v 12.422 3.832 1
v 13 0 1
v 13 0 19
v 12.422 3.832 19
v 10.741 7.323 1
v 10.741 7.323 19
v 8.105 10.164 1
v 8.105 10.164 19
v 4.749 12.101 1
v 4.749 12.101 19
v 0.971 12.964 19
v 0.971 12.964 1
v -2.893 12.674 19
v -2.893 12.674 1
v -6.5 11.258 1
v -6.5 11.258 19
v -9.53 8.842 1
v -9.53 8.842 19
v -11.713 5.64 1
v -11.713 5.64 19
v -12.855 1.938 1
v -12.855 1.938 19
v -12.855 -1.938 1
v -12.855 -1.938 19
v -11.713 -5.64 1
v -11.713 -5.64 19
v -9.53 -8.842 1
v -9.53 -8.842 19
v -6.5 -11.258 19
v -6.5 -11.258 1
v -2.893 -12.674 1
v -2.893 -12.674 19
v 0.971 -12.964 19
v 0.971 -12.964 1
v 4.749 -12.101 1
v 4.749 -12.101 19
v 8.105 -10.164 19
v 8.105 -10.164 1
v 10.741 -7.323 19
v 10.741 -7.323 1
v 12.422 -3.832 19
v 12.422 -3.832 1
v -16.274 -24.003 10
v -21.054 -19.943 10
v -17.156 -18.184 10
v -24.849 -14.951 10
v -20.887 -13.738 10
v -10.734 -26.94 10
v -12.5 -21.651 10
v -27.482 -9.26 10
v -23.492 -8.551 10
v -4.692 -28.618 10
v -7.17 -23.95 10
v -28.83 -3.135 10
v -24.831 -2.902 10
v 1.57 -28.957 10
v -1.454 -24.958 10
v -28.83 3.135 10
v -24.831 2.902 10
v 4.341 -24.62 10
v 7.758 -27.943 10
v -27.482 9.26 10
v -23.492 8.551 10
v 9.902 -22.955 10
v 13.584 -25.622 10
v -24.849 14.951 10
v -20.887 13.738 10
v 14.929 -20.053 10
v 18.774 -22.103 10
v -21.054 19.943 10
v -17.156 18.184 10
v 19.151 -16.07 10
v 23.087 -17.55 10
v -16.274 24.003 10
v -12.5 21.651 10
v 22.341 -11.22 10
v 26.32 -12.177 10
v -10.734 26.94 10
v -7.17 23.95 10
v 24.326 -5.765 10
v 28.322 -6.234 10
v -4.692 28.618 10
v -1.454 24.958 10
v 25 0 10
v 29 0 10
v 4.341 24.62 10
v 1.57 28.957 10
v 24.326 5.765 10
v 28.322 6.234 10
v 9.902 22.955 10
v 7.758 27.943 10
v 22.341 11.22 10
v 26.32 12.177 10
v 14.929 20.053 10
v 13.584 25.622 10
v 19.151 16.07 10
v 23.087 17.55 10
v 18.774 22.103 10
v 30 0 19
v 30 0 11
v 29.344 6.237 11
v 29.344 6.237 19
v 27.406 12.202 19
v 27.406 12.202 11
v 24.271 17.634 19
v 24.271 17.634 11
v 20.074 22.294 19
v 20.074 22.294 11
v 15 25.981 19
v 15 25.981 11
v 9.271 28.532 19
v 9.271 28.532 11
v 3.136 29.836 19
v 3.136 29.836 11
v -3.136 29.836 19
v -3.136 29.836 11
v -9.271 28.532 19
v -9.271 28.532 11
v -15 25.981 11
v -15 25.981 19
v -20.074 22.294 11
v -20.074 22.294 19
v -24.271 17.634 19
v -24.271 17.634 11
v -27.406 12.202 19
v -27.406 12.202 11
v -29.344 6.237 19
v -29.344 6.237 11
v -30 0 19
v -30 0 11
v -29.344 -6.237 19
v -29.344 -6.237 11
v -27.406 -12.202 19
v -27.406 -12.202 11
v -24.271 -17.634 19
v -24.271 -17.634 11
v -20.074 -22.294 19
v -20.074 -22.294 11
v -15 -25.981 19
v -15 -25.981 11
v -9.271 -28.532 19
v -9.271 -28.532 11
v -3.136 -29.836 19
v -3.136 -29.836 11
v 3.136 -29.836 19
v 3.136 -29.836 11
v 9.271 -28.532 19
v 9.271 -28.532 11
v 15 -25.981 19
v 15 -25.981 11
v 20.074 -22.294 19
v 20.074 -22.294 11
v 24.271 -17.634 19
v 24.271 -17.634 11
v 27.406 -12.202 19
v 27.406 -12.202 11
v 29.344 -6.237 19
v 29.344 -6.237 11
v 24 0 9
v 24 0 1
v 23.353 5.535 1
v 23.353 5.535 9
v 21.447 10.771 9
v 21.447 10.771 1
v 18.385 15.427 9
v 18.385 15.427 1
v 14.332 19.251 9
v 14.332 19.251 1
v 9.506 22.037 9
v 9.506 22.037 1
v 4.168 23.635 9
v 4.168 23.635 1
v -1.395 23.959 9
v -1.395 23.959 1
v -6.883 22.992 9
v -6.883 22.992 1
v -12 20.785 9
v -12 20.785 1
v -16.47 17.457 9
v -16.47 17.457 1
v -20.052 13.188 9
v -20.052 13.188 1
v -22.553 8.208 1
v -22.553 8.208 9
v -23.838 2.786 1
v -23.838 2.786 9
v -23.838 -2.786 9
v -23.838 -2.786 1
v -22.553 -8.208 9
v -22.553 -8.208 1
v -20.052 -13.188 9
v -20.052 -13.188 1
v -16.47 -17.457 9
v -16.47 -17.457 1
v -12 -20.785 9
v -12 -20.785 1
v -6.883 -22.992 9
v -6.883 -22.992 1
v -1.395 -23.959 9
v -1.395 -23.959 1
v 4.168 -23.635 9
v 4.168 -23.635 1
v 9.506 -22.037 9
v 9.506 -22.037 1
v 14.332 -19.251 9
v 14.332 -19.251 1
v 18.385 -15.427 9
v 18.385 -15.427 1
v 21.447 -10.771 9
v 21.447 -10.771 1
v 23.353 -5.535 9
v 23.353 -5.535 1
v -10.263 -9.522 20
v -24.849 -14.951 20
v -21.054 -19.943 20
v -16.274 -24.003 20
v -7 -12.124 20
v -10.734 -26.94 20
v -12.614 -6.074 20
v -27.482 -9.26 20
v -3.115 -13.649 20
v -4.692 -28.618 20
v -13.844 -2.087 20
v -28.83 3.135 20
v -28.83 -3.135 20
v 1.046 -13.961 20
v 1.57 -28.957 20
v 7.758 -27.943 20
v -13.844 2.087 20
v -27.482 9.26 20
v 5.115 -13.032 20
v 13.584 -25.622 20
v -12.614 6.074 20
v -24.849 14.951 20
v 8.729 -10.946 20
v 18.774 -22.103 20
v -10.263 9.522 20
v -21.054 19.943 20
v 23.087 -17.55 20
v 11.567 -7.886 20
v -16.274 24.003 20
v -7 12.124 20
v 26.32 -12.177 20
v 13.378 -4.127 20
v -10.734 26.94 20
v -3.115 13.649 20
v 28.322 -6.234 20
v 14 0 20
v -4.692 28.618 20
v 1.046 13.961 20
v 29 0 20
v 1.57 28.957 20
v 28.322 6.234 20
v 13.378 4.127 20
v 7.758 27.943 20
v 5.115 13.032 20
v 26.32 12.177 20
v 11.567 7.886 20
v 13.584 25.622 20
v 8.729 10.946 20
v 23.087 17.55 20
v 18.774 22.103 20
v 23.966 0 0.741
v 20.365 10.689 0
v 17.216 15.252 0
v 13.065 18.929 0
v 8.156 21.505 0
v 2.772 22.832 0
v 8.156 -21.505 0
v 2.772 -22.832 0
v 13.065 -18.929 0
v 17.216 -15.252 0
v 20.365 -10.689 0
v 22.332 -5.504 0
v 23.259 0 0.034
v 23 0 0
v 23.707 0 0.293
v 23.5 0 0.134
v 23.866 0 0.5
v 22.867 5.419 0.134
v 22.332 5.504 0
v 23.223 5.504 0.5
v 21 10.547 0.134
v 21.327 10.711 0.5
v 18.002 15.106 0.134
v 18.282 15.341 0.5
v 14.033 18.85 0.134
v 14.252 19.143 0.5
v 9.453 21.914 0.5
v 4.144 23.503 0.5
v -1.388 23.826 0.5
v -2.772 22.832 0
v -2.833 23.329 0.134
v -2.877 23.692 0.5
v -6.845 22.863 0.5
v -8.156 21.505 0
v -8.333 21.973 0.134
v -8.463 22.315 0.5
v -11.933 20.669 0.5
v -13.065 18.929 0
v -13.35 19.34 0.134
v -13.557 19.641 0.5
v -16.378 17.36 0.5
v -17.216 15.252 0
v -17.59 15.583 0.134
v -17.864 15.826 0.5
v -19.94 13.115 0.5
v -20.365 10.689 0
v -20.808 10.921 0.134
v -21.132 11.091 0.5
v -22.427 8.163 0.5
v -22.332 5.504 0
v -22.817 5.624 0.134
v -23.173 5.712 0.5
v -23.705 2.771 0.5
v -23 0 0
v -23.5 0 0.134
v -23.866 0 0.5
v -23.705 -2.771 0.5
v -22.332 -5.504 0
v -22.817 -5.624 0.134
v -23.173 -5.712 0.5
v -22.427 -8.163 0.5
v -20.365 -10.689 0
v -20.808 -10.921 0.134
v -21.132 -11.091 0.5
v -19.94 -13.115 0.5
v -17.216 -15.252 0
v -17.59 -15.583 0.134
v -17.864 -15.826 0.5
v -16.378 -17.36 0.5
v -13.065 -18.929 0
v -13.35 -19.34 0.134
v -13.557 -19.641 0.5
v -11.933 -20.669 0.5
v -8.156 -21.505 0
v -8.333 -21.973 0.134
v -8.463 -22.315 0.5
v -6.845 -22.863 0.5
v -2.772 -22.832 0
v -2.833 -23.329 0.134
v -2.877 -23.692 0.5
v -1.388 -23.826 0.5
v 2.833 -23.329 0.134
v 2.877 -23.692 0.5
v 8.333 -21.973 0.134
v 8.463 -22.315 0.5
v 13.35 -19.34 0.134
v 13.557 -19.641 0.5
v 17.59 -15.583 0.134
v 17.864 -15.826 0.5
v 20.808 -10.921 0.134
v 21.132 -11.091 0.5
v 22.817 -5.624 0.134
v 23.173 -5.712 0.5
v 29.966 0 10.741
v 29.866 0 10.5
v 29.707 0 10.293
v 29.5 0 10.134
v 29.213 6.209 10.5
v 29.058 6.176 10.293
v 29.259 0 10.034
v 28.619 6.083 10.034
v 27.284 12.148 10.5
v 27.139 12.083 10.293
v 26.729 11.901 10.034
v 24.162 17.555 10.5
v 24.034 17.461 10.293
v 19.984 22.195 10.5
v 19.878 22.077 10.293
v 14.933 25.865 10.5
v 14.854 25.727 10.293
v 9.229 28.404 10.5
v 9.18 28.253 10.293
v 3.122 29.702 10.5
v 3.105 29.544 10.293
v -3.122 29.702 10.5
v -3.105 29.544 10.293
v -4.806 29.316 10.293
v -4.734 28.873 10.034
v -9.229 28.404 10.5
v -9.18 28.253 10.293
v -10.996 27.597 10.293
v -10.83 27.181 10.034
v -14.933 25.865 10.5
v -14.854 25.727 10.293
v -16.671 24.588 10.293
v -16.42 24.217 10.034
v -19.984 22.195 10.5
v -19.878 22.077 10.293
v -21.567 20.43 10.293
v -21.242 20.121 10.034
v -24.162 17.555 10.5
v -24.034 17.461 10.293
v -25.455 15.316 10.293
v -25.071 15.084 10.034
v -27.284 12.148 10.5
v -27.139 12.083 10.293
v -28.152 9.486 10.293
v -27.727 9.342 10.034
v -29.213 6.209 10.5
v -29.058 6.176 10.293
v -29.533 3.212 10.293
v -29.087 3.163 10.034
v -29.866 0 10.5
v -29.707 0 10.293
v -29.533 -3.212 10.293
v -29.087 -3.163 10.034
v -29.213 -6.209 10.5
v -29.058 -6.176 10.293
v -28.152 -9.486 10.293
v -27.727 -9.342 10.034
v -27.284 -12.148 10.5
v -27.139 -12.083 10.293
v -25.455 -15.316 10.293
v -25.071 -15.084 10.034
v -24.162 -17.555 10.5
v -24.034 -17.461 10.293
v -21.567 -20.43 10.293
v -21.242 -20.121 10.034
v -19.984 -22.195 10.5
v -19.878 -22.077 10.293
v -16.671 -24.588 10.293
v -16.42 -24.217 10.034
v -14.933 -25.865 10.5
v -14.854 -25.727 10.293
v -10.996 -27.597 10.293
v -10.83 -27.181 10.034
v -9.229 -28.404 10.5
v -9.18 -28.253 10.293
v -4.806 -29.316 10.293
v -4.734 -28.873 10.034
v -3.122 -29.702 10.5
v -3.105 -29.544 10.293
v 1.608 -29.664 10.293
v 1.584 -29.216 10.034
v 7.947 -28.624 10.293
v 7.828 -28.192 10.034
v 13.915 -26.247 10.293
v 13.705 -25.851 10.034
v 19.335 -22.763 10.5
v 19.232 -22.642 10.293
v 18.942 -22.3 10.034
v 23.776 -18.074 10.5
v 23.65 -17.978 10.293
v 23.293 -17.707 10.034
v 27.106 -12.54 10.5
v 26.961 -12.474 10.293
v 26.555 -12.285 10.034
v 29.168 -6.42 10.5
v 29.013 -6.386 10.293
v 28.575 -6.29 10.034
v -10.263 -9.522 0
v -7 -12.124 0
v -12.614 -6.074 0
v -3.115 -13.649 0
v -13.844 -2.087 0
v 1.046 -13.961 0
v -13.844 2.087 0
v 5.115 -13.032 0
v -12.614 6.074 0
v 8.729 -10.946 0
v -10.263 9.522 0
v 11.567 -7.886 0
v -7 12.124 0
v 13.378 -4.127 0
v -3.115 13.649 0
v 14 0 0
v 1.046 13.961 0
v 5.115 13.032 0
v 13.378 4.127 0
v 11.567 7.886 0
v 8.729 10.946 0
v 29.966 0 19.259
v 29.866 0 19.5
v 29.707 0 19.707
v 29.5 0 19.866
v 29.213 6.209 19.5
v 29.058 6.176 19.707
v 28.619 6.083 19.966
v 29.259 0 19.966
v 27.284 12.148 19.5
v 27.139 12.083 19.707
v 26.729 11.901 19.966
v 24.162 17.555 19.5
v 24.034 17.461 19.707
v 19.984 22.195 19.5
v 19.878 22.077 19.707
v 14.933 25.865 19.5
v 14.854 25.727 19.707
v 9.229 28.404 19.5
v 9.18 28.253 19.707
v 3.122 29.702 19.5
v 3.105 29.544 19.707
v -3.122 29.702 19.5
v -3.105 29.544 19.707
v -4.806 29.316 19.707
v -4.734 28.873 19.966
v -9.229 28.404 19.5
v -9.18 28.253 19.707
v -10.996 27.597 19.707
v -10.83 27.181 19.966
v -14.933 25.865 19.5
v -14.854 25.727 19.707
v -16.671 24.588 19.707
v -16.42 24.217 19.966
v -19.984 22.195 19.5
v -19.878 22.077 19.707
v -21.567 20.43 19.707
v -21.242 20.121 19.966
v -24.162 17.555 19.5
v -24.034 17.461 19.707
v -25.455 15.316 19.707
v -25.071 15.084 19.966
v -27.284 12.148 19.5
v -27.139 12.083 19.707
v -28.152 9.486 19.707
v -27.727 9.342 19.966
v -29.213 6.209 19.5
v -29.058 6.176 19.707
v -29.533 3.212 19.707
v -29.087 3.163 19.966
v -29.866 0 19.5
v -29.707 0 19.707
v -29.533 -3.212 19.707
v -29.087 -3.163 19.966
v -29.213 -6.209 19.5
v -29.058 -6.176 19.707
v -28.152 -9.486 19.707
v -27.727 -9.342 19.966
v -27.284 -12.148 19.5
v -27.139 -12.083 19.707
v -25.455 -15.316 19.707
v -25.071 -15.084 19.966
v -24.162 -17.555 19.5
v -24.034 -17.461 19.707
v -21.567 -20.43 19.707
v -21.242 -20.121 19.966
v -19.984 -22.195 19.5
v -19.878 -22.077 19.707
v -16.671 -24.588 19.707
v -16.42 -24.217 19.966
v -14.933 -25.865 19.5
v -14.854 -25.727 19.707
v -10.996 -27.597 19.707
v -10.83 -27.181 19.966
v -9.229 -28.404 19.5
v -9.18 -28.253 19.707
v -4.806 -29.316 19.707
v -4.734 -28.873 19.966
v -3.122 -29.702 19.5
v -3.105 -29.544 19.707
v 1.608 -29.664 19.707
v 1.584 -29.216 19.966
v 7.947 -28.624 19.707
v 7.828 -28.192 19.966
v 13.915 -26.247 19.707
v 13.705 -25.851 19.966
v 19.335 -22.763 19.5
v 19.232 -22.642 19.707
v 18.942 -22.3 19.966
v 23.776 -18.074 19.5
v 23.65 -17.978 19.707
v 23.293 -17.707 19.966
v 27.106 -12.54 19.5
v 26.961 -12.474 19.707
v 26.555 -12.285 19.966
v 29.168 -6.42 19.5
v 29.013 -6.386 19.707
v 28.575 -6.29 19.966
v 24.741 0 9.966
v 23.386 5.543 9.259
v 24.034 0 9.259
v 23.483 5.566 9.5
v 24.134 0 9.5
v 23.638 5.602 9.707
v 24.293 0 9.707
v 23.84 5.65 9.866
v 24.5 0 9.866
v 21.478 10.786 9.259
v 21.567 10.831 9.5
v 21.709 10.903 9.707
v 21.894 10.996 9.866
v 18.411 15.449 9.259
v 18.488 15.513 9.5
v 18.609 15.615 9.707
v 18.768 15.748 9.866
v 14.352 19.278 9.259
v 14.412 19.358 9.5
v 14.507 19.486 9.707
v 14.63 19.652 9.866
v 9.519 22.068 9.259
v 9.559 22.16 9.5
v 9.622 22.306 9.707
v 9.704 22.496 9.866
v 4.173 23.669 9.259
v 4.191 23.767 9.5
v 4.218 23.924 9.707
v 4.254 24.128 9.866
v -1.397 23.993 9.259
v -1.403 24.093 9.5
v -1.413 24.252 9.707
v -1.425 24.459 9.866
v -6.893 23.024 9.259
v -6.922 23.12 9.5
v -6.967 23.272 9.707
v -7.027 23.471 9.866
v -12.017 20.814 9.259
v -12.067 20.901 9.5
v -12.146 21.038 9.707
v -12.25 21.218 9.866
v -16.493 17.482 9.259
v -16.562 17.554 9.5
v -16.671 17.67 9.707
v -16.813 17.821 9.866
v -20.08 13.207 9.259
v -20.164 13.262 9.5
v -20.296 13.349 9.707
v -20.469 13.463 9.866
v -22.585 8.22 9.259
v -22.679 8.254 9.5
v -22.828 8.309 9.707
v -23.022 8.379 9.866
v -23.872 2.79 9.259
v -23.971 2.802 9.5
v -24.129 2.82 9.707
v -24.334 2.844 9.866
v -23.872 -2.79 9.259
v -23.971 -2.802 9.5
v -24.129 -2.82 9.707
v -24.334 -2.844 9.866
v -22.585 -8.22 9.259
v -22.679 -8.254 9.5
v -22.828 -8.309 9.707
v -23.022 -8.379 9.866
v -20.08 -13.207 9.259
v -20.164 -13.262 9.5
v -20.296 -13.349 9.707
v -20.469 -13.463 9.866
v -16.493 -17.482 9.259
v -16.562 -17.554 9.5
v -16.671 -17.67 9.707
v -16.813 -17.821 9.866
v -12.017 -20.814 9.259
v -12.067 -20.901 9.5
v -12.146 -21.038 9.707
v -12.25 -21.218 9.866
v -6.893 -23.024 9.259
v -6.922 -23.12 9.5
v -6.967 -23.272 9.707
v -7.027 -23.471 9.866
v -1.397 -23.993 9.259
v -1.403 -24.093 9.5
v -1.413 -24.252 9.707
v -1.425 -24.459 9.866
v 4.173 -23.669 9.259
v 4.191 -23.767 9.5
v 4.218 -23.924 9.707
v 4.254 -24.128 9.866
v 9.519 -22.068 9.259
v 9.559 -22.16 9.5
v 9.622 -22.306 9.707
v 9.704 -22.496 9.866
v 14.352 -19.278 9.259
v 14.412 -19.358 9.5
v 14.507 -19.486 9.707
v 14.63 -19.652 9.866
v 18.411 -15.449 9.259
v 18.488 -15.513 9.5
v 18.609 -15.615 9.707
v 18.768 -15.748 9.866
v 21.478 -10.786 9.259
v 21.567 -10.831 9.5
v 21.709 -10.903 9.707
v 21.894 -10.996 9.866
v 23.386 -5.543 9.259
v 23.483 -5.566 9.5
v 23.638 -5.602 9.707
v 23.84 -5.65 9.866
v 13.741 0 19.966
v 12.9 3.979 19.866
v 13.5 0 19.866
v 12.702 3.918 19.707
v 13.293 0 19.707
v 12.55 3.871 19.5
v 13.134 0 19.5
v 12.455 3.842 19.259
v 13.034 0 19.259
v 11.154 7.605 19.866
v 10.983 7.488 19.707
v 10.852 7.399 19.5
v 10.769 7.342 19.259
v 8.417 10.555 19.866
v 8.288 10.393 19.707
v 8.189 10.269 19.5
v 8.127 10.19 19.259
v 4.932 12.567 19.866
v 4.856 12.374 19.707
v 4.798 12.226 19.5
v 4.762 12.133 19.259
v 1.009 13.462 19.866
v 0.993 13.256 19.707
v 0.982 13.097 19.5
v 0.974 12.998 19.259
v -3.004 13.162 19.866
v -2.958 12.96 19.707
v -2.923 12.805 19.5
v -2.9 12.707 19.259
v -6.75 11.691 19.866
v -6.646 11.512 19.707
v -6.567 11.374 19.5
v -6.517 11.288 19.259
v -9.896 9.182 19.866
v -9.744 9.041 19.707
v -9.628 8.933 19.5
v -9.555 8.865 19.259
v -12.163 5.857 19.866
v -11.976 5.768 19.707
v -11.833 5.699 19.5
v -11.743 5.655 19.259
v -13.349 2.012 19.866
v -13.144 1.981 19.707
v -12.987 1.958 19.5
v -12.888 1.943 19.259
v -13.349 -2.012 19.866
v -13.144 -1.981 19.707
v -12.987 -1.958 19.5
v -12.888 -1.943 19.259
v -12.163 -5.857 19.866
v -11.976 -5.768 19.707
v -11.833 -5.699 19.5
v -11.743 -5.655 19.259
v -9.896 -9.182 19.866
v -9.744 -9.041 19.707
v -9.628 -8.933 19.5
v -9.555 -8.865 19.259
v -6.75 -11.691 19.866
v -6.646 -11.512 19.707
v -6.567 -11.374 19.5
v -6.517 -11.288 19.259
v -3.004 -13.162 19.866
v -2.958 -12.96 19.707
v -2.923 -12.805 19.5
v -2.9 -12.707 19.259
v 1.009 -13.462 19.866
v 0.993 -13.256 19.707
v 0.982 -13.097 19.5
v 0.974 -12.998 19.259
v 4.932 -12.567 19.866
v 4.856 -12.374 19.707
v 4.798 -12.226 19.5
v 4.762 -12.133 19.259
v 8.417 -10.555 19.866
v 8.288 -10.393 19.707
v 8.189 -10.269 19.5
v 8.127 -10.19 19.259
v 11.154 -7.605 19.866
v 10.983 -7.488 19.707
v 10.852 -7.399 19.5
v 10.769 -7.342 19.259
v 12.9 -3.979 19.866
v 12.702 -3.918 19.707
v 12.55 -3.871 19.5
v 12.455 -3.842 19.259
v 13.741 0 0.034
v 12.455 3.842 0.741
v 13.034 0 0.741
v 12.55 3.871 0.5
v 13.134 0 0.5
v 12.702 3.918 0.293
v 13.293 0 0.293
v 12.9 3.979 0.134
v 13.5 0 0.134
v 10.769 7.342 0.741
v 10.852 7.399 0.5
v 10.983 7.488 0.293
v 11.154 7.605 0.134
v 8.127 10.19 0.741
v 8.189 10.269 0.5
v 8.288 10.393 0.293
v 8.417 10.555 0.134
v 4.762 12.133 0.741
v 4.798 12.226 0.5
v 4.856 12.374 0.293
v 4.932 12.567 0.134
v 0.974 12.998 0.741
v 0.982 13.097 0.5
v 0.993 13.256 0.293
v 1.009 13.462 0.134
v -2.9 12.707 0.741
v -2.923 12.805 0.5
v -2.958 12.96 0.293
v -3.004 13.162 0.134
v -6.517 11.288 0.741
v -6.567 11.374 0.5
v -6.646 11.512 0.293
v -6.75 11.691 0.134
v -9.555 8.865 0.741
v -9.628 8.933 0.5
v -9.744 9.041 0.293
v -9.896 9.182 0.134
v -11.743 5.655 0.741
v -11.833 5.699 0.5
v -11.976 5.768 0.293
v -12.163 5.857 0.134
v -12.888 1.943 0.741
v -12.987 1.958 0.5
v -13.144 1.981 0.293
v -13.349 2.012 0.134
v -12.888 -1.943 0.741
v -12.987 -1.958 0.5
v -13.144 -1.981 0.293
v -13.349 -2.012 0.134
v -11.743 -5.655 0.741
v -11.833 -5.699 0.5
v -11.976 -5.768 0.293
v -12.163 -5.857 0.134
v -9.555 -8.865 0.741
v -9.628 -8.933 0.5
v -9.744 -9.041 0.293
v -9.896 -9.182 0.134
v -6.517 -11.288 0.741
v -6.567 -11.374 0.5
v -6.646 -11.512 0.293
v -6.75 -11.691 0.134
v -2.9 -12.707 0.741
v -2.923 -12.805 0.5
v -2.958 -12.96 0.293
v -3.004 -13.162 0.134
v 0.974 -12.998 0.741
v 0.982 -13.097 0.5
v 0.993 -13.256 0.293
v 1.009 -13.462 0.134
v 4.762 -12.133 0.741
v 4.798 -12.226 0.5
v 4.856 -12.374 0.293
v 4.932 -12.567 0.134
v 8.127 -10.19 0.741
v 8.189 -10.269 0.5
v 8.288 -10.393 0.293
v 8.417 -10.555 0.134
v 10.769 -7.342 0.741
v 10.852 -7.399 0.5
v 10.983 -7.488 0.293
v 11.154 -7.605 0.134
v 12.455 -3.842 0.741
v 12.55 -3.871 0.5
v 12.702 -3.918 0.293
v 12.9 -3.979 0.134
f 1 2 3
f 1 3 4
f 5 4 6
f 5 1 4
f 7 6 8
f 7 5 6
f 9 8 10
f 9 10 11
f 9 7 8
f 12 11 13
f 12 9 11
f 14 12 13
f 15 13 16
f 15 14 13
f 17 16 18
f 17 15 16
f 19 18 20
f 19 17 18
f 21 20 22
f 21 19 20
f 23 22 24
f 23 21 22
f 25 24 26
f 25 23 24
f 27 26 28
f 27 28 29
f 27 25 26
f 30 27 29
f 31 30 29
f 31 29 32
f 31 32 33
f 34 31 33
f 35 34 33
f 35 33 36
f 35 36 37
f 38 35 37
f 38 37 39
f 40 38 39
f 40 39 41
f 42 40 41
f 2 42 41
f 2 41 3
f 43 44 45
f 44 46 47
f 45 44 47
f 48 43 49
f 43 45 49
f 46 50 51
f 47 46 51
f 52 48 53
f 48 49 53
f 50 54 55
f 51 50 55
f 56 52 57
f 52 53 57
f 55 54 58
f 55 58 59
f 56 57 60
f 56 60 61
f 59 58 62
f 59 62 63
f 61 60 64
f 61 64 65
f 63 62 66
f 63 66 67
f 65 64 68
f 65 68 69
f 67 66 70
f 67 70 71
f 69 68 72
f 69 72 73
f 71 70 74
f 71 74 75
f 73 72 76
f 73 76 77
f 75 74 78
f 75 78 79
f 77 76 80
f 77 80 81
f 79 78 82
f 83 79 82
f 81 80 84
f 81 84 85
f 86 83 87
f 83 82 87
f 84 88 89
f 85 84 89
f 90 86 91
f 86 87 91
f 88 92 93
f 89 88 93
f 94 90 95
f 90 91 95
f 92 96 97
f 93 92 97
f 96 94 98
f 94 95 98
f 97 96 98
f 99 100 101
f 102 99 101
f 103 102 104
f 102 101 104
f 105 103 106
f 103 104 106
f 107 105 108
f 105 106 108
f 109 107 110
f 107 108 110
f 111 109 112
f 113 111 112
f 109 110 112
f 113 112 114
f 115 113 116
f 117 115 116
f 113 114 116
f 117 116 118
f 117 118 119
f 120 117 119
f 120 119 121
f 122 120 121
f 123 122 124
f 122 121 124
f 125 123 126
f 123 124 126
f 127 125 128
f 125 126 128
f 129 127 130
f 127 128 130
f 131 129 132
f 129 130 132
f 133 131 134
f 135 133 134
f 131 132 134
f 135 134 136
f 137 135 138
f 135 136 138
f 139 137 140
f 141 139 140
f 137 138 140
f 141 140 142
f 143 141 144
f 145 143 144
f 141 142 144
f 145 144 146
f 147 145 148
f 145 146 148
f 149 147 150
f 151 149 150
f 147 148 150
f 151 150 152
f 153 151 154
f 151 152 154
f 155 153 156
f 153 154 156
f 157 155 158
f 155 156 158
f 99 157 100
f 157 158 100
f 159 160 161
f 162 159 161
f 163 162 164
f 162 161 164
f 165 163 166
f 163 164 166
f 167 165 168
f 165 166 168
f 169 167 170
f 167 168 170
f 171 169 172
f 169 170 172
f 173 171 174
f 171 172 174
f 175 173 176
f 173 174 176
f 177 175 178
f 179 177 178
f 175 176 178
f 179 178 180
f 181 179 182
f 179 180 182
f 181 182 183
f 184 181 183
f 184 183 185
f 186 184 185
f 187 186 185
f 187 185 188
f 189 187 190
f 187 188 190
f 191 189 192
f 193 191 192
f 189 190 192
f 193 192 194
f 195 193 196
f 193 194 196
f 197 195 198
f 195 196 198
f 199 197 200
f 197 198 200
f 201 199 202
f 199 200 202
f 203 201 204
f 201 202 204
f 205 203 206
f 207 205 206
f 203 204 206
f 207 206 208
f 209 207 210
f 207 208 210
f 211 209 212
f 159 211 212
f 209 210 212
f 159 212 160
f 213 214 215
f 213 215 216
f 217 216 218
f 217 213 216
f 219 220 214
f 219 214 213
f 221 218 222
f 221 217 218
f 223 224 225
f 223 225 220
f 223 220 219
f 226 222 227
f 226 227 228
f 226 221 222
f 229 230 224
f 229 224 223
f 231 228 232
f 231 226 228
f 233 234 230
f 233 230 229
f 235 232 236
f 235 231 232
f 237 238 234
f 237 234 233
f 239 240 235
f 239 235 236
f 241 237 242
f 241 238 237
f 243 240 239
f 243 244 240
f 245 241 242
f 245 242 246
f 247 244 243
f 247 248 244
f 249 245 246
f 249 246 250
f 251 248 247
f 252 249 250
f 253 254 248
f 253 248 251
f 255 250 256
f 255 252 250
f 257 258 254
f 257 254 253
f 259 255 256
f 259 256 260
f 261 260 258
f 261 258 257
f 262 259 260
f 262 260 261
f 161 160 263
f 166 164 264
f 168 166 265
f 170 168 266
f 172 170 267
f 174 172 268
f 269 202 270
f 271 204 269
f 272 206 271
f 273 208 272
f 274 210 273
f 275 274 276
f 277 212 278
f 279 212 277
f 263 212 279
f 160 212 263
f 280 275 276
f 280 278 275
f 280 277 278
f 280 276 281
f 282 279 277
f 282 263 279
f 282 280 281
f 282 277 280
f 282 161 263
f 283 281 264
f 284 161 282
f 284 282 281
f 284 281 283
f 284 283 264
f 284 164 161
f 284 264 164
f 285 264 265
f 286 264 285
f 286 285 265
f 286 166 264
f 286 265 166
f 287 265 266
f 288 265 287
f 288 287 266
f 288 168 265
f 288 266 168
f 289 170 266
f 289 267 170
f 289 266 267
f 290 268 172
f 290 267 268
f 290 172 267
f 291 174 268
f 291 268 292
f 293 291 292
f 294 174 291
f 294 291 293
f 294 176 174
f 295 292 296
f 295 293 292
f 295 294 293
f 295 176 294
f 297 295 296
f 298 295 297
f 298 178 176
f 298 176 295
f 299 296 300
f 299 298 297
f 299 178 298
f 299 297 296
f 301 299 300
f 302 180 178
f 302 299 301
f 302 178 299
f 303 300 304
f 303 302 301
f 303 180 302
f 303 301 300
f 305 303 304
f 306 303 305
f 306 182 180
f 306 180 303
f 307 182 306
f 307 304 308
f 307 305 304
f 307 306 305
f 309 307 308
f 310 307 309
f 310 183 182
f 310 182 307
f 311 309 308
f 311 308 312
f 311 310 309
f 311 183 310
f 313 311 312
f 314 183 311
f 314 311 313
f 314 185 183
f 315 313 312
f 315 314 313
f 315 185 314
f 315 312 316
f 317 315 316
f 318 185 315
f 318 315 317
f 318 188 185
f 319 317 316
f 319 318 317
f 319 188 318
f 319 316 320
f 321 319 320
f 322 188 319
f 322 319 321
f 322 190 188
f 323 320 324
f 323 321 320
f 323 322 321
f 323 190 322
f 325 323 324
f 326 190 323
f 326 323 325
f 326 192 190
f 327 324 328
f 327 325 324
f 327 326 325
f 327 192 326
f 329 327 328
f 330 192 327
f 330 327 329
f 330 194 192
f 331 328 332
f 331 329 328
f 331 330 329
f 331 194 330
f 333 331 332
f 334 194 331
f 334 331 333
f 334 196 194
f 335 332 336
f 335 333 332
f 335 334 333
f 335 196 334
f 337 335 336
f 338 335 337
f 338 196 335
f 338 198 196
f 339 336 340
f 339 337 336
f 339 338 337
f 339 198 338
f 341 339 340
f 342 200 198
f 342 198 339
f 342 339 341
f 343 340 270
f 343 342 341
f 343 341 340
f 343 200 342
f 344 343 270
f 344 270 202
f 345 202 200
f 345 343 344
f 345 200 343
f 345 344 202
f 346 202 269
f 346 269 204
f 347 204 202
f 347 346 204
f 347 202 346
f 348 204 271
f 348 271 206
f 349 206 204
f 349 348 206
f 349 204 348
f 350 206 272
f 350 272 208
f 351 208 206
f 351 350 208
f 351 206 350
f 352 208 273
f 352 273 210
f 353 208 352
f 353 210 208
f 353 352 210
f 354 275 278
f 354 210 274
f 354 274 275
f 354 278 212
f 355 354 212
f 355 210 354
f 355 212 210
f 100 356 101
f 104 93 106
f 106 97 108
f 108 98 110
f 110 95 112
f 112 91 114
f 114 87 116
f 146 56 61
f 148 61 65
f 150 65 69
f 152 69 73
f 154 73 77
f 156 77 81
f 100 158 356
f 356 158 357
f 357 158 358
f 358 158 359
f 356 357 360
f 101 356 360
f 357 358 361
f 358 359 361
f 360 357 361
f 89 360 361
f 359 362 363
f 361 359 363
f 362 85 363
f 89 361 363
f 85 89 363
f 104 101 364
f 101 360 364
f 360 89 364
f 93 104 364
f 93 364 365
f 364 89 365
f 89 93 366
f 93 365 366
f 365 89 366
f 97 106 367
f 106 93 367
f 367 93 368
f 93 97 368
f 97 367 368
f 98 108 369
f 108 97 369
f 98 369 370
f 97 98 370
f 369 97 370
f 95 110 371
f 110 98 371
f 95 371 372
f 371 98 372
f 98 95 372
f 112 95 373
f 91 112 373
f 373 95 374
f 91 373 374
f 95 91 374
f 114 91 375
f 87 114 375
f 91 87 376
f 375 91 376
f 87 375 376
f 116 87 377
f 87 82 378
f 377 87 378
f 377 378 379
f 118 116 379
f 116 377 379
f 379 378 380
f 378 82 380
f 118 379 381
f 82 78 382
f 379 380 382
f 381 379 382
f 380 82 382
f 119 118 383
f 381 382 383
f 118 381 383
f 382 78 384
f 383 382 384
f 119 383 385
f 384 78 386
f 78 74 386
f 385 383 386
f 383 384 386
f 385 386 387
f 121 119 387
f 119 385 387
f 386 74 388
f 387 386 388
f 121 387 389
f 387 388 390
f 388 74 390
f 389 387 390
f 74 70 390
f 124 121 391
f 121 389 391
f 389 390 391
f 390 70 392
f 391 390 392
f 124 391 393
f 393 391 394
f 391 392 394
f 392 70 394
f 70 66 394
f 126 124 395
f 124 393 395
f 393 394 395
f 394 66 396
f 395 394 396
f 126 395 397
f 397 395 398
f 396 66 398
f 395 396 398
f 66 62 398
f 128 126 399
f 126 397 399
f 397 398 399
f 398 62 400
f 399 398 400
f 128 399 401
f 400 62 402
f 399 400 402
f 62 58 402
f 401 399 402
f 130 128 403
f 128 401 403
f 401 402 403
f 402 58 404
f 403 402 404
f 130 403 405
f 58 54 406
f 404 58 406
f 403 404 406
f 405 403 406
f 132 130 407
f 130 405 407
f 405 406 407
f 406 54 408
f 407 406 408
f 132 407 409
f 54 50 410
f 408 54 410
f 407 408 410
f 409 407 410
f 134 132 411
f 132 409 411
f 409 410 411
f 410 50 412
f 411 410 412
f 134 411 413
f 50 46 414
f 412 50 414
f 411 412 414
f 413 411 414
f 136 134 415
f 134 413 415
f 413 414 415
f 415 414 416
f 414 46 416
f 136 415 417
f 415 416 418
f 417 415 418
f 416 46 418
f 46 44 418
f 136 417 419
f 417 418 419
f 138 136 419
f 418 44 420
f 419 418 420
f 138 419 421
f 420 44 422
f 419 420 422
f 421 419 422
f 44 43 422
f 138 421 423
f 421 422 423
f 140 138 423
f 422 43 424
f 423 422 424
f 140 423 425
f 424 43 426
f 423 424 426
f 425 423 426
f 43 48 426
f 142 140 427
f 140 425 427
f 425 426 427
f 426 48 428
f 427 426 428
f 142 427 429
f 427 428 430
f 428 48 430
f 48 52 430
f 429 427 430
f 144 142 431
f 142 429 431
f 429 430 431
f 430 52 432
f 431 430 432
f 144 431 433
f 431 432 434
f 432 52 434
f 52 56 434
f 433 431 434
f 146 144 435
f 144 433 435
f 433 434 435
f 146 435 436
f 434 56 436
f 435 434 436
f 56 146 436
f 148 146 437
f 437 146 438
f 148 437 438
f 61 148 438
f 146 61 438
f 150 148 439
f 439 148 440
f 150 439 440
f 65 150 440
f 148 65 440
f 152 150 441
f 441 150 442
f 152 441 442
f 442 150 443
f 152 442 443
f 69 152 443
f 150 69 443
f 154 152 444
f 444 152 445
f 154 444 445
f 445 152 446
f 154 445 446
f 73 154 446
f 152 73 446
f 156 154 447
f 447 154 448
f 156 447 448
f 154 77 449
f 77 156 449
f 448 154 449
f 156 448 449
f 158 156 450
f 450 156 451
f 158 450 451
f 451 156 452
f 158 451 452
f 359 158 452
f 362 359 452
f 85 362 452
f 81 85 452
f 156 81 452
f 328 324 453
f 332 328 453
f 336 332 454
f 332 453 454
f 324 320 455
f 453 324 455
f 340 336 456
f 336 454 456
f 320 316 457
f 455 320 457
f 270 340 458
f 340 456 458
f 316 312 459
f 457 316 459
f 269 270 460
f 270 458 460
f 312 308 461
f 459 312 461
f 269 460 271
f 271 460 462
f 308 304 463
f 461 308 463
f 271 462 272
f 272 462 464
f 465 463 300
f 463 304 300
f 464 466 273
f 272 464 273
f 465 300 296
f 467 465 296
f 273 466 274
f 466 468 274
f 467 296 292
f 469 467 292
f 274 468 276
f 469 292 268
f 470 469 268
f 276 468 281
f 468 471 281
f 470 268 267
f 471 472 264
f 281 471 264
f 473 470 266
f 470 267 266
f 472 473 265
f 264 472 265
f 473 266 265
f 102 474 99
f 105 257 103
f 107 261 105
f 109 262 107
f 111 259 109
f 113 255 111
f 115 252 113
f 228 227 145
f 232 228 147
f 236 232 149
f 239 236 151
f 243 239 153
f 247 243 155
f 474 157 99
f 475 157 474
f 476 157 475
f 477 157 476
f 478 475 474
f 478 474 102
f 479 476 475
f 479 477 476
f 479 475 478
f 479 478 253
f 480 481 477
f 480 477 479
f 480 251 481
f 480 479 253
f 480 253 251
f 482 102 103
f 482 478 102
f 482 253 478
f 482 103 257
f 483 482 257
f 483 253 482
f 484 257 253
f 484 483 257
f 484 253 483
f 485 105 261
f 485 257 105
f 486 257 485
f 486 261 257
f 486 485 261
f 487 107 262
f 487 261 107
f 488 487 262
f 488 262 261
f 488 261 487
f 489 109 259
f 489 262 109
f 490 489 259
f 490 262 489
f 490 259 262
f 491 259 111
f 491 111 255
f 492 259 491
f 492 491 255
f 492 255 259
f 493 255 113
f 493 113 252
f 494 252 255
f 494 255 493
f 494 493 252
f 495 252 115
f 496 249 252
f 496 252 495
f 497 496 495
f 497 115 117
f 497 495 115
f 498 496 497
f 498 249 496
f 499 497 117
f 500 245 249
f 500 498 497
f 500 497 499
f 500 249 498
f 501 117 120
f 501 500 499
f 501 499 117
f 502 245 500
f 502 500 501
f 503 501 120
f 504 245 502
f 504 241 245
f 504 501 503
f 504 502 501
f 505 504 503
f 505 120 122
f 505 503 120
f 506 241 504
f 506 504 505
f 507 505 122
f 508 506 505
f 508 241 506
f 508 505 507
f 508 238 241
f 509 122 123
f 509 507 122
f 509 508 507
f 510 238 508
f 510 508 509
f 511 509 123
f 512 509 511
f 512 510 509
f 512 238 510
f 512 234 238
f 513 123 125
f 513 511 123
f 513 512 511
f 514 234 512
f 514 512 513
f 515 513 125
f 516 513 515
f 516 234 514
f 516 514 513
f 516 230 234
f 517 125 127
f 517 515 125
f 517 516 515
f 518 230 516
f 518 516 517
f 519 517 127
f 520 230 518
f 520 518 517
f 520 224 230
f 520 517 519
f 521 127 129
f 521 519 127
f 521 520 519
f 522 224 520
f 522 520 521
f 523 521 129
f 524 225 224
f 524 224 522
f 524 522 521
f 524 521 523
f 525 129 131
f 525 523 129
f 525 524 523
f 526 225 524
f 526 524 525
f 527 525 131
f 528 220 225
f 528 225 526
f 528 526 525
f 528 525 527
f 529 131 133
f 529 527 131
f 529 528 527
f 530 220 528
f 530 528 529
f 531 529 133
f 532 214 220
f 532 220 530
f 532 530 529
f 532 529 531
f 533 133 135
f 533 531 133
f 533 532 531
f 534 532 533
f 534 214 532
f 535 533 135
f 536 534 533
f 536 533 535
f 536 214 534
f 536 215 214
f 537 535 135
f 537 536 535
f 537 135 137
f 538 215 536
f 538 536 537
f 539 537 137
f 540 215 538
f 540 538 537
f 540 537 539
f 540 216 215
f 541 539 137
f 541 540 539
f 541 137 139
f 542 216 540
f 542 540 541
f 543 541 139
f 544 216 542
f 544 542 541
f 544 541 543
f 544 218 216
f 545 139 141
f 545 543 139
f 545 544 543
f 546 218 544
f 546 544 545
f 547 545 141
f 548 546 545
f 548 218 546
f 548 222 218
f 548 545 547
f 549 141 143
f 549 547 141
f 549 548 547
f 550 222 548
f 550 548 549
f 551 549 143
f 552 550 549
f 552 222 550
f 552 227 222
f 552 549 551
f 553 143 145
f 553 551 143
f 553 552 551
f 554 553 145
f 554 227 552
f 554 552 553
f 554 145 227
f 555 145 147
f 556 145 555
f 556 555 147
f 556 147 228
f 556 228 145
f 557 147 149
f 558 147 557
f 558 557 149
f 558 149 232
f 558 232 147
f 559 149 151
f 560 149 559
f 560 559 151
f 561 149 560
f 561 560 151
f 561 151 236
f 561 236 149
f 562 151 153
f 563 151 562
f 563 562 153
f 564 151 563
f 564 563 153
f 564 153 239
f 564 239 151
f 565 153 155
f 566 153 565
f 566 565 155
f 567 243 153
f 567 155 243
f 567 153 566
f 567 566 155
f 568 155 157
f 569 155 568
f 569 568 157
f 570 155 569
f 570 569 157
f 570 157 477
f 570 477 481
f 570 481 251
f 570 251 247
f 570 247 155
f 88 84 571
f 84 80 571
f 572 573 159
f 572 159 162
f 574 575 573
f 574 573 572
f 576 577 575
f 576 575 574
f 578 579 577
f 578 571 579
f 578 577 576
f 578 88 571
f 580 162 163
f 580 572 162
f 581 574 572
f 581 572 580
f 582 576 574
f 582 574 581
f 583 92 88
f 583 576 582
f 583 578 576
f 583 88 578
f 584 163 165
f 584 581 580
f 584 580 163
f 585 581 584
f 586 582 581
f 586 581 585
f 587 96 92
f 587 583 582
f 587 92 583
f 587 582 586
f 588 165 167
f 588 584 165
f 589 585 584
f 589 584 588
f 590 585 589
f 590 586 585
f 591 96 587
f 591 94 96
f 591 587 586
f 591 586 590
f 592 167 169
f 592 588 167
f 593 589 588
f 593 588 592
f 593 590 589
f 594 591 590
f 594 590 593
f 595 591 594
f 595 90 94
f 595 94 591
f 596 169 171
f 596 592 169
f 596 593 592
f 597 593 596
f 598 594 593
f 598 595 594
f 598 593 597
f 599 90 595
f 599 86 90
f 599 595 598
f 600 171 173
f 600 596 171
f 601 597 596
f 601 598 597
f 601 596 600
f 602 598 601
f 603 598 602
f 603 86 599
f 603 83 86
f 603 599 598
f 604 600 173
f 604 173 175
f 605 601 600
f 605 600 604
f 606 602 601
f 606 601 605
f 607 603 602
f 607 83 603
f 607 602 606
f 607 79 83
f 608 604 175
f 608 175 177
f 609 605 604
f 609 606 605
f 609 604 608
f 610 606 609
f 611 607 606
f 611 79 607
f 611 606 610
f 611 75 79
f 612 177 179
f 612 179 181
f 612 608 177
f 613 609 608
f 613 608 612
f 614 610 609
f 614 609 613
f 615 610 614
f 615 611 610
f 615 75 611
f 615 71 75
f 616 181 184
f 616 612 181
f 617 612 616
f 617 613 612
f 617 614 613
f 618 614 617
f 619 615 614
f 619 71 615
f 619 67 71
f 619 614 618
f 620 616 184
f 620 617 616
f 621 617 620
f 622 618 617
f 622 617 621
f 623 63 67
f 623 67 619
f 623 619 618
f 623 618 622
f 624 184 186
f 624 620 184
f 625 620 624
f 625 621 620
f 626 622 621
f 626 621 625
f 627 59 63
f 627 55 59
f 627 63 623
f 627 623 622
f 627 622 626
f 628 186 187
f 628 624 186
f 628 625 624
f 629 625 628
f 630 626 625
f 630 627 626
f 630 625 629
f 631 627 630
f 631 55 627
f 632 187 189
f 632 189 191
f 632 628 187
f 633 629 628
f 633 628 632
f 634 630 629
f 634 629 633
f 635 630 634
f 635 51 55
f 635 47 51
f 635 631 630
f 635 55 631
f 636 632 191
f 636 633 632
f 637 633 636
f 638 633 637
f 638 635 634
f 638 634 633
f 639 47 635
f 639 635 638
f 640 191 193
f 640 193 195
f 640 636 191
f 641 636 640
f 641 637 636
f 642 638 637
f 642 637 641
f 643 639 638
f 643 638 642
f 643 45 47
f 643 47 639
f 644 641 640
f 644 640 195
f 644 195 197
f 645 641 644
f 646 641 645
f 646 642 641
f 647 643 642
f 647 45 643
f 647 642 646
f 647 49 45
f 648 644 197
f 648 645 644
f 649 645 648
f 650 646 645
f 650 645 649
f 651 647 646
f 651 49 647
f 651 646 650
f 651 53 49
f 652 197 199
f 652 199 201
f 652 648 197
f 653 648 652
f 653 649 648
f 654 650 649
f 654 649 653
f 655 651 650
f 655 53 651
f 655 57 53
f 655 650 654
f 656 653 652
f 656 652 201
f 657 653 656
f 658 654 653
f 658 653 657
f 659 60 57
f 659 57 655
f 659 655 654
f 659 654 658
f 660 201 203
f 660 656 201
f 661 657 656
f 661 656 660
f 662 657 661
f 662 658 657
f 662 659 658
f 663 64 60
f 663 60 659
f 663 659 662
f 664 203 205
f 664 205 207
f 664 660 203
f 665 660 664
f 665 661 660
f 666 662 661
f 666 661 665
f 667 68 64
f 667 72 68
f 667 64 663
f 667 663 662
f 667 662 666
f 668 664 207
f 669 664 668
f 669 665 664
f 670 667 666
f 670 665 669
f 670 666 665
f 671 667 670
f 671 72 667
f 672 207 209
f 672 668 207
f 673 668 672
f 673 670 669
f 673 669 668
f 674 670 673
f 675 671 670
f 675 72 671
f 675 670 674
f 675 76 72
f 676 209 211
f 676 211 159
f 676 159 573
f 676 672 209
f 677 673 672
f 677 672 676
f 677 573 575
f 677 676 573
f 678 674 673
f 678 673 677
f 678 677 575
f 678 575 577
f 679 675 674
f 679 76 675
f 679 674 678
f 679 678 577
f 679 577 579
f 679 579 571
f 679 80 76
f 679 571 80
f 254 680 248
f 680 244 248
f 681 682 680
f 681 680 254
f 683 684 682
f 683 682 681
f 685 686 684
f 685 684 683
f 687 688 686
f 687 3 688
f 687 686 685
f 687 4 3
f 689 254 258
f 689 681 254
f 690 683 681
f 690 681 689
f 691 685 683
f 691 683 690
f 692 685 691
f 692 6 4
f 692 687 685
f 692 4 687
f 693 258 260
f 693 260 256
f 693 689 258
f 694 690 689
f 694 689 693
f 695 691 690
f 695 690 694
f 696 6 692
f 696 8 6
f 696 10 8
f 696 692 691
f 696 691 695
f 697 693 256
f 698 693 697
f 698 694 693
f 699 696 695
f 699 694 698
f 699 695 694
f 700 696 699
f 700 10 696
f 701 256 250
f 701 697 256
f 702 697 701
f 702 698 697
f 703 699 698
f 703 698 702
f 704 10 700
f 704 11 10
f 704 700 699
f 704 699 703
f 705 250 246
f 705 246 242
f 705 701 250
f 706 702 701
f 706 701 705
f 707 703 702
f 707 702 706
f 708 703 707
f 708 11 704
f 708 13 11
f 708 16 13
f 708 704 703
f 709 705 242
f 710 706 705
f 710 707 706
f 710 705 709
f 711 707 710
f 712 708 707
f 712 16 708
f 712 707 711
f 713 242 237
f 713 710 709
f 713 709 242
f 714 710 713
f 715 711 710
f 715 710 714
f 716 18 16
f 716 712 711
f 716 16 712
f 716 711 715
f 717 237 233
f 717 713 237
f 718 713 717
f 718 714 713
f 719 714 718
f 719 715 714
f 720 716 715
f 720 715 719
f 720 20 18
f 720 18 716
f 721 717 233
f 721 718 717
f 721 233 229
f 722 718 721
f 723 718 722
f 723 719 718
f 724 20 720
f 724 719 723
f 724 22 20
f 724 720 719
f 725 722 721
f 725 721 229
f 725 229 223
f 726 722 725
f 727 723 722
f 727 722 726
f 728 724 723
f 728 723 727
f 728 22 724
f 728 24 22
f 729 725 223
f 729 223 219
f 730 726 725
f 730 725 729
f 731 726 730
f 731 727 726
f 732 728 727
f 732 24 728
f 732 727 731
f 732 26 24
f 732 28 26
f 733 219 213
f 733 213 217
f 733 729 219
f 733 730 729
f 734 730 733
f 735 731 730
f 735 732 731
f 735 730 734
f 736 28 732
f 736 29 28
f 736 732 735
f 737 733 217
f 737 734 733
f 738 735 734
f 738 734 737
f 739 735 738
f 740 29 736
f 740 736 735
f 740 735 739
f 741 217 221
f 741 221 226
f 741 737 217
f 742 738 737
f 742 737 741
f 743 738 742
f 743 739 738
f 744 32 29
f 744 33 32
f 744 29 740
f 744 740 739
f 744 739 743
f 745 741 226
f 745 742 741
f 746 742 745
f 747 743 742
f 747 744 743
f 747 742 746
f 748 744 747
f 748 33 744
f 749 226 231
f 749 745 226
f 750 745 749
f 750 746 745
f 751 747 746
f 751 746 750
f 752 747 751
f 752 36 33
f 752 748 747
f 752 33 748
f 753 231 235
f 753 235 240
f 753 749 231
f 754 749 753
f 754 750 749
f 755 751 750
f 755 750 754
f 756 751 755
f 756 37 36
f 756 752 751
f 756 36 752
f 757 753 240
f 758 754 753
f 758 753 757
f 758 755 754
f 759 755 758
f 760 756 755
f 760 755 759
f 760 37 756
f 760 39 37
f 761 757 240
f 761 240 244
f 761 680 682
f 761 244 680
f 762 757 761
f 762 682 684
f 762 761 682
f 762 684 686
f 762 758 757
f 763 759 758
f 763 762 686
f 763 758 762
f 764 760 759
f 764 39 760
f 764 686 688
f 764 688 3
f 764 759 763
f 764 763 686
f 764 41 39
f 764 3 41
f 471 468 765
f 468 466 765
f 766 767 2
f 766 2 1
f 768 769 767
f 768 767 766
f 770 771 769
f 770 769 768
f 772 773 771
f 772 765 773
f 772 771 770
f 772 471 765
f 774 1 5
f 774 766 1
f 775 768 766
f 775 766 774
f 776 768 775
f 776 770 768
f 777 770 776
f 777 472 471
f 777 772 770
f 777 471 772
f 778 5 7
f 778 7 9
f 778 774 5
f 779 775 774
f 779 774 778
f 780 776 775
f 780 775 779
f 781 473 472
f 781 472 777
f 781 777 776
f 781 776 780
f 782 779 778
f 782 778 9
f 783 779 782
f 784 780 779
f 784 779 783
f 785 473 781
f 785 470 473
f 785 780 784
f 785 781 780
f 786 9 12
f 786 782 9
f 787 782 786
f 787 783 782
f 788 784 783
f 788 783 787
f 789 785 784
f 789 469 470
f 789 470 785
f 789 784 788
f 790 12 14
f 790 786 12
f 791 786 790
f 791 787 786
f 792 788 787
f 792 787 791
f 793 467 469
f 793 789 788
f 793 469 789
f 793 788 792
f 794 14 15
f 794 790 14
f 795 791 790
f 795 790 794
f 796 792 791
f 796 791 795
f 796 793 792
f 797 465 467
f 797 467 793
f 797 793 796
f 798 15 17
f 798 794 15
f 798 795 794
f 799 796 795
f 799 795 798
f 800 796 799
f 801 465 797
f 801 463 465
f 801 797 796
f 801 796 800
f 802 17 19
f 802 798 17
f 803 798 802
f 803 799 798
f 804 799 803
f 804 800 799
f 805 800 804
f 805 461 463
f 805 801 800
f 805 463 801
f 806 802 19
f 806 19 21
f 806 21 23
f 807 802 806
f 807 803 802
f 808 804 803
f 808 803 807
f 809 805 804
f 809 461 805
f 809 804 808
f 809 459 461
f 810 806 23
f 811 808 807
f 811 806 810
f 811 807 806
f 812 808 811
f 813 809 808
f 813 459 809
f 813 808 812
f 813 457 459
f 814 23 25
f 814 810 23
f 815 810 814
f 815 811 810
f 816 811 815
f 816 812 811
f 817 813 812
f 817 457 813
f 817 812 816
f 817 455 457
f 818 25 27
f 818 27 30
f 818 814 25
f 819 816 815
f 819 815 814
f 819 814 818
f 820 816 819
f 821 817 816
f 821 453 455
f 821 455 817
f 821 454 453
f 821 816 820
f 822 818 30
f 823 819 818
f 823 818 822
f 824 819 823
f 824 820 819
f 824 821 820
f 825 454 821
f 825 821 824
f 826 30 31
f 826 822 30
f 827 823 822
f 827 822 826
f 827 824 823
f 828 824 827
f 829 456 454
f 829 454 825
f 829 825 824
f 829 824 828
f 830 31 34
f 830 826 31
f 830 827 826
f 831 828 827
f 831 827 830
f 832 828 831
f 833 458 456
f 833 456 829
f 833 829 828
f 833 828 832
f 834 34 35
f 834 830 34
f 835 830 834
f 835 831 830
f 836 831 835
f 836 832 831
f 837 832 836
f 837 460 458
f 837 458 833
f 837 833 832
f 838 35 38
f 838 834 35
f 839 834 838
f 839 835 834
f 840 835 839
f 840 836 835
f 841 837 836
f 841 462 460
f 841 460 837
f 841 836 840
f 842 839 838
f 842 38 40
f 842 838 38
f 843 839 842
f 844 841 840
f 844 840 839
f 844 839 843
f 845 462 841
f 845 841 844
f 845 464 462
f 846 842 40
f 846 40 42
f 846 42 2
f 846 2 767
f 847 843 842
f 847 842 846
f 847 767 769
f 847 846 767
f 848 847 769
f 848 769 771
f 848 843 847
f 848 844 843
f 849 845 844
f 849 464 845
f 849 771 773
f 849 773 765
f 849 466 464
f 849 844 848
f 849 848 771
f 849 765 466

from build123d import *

# Parameters (mm, degrees)
SKETCH_R      = 24
SKETCH_R_2    = 13
PAD_DEPTH     = 10
SKETCH001_R   = 30
SKETCH001_R_2 = 13
PAD001_DEPTH  = 10
FILLET_R      = 1
FILLET001_R   = 1


with BuildPart() as part:
    # Sketch → Pad (new body)
    with BuildSketch(Plane.XY):
        Circle(SKETCH_R)
        Circle(SKETCH_R_2, mode=Mode.SUBTRACT)
    extrude(amount=PAD_DEPTH)

    # Sketch001 (on Face4 of Pad) → Pad001 (join)
    with BuildSketch(Plane.XY.offset(10)):
        Circle(SKETCH001_R)
        Circle(SKETCH001_R_2, mode=Mode.SUBTRACT)
    extrude(amount=PAD001_DEPTH)

    # Fillet
    fillet_edges = [part.edges().sort_by_distance(p)[0] for p in [
        (-24, 0, 0),
        (-30, 0, 10),
        (-30, 0, 20),
        (-24, 0, 10),
    ]]
    fillet(fillet_edges, radius=FILLET_R)

    # Fillet001
    fillet001_edges = [part.edges().sort_by_distance(p)[0] for p in [
        (-13, 0, 0),
        (-13, 0, 20),
    ]]
    fillet(fillet001_edges, radius=FILLET001_R)


solid = part.part
